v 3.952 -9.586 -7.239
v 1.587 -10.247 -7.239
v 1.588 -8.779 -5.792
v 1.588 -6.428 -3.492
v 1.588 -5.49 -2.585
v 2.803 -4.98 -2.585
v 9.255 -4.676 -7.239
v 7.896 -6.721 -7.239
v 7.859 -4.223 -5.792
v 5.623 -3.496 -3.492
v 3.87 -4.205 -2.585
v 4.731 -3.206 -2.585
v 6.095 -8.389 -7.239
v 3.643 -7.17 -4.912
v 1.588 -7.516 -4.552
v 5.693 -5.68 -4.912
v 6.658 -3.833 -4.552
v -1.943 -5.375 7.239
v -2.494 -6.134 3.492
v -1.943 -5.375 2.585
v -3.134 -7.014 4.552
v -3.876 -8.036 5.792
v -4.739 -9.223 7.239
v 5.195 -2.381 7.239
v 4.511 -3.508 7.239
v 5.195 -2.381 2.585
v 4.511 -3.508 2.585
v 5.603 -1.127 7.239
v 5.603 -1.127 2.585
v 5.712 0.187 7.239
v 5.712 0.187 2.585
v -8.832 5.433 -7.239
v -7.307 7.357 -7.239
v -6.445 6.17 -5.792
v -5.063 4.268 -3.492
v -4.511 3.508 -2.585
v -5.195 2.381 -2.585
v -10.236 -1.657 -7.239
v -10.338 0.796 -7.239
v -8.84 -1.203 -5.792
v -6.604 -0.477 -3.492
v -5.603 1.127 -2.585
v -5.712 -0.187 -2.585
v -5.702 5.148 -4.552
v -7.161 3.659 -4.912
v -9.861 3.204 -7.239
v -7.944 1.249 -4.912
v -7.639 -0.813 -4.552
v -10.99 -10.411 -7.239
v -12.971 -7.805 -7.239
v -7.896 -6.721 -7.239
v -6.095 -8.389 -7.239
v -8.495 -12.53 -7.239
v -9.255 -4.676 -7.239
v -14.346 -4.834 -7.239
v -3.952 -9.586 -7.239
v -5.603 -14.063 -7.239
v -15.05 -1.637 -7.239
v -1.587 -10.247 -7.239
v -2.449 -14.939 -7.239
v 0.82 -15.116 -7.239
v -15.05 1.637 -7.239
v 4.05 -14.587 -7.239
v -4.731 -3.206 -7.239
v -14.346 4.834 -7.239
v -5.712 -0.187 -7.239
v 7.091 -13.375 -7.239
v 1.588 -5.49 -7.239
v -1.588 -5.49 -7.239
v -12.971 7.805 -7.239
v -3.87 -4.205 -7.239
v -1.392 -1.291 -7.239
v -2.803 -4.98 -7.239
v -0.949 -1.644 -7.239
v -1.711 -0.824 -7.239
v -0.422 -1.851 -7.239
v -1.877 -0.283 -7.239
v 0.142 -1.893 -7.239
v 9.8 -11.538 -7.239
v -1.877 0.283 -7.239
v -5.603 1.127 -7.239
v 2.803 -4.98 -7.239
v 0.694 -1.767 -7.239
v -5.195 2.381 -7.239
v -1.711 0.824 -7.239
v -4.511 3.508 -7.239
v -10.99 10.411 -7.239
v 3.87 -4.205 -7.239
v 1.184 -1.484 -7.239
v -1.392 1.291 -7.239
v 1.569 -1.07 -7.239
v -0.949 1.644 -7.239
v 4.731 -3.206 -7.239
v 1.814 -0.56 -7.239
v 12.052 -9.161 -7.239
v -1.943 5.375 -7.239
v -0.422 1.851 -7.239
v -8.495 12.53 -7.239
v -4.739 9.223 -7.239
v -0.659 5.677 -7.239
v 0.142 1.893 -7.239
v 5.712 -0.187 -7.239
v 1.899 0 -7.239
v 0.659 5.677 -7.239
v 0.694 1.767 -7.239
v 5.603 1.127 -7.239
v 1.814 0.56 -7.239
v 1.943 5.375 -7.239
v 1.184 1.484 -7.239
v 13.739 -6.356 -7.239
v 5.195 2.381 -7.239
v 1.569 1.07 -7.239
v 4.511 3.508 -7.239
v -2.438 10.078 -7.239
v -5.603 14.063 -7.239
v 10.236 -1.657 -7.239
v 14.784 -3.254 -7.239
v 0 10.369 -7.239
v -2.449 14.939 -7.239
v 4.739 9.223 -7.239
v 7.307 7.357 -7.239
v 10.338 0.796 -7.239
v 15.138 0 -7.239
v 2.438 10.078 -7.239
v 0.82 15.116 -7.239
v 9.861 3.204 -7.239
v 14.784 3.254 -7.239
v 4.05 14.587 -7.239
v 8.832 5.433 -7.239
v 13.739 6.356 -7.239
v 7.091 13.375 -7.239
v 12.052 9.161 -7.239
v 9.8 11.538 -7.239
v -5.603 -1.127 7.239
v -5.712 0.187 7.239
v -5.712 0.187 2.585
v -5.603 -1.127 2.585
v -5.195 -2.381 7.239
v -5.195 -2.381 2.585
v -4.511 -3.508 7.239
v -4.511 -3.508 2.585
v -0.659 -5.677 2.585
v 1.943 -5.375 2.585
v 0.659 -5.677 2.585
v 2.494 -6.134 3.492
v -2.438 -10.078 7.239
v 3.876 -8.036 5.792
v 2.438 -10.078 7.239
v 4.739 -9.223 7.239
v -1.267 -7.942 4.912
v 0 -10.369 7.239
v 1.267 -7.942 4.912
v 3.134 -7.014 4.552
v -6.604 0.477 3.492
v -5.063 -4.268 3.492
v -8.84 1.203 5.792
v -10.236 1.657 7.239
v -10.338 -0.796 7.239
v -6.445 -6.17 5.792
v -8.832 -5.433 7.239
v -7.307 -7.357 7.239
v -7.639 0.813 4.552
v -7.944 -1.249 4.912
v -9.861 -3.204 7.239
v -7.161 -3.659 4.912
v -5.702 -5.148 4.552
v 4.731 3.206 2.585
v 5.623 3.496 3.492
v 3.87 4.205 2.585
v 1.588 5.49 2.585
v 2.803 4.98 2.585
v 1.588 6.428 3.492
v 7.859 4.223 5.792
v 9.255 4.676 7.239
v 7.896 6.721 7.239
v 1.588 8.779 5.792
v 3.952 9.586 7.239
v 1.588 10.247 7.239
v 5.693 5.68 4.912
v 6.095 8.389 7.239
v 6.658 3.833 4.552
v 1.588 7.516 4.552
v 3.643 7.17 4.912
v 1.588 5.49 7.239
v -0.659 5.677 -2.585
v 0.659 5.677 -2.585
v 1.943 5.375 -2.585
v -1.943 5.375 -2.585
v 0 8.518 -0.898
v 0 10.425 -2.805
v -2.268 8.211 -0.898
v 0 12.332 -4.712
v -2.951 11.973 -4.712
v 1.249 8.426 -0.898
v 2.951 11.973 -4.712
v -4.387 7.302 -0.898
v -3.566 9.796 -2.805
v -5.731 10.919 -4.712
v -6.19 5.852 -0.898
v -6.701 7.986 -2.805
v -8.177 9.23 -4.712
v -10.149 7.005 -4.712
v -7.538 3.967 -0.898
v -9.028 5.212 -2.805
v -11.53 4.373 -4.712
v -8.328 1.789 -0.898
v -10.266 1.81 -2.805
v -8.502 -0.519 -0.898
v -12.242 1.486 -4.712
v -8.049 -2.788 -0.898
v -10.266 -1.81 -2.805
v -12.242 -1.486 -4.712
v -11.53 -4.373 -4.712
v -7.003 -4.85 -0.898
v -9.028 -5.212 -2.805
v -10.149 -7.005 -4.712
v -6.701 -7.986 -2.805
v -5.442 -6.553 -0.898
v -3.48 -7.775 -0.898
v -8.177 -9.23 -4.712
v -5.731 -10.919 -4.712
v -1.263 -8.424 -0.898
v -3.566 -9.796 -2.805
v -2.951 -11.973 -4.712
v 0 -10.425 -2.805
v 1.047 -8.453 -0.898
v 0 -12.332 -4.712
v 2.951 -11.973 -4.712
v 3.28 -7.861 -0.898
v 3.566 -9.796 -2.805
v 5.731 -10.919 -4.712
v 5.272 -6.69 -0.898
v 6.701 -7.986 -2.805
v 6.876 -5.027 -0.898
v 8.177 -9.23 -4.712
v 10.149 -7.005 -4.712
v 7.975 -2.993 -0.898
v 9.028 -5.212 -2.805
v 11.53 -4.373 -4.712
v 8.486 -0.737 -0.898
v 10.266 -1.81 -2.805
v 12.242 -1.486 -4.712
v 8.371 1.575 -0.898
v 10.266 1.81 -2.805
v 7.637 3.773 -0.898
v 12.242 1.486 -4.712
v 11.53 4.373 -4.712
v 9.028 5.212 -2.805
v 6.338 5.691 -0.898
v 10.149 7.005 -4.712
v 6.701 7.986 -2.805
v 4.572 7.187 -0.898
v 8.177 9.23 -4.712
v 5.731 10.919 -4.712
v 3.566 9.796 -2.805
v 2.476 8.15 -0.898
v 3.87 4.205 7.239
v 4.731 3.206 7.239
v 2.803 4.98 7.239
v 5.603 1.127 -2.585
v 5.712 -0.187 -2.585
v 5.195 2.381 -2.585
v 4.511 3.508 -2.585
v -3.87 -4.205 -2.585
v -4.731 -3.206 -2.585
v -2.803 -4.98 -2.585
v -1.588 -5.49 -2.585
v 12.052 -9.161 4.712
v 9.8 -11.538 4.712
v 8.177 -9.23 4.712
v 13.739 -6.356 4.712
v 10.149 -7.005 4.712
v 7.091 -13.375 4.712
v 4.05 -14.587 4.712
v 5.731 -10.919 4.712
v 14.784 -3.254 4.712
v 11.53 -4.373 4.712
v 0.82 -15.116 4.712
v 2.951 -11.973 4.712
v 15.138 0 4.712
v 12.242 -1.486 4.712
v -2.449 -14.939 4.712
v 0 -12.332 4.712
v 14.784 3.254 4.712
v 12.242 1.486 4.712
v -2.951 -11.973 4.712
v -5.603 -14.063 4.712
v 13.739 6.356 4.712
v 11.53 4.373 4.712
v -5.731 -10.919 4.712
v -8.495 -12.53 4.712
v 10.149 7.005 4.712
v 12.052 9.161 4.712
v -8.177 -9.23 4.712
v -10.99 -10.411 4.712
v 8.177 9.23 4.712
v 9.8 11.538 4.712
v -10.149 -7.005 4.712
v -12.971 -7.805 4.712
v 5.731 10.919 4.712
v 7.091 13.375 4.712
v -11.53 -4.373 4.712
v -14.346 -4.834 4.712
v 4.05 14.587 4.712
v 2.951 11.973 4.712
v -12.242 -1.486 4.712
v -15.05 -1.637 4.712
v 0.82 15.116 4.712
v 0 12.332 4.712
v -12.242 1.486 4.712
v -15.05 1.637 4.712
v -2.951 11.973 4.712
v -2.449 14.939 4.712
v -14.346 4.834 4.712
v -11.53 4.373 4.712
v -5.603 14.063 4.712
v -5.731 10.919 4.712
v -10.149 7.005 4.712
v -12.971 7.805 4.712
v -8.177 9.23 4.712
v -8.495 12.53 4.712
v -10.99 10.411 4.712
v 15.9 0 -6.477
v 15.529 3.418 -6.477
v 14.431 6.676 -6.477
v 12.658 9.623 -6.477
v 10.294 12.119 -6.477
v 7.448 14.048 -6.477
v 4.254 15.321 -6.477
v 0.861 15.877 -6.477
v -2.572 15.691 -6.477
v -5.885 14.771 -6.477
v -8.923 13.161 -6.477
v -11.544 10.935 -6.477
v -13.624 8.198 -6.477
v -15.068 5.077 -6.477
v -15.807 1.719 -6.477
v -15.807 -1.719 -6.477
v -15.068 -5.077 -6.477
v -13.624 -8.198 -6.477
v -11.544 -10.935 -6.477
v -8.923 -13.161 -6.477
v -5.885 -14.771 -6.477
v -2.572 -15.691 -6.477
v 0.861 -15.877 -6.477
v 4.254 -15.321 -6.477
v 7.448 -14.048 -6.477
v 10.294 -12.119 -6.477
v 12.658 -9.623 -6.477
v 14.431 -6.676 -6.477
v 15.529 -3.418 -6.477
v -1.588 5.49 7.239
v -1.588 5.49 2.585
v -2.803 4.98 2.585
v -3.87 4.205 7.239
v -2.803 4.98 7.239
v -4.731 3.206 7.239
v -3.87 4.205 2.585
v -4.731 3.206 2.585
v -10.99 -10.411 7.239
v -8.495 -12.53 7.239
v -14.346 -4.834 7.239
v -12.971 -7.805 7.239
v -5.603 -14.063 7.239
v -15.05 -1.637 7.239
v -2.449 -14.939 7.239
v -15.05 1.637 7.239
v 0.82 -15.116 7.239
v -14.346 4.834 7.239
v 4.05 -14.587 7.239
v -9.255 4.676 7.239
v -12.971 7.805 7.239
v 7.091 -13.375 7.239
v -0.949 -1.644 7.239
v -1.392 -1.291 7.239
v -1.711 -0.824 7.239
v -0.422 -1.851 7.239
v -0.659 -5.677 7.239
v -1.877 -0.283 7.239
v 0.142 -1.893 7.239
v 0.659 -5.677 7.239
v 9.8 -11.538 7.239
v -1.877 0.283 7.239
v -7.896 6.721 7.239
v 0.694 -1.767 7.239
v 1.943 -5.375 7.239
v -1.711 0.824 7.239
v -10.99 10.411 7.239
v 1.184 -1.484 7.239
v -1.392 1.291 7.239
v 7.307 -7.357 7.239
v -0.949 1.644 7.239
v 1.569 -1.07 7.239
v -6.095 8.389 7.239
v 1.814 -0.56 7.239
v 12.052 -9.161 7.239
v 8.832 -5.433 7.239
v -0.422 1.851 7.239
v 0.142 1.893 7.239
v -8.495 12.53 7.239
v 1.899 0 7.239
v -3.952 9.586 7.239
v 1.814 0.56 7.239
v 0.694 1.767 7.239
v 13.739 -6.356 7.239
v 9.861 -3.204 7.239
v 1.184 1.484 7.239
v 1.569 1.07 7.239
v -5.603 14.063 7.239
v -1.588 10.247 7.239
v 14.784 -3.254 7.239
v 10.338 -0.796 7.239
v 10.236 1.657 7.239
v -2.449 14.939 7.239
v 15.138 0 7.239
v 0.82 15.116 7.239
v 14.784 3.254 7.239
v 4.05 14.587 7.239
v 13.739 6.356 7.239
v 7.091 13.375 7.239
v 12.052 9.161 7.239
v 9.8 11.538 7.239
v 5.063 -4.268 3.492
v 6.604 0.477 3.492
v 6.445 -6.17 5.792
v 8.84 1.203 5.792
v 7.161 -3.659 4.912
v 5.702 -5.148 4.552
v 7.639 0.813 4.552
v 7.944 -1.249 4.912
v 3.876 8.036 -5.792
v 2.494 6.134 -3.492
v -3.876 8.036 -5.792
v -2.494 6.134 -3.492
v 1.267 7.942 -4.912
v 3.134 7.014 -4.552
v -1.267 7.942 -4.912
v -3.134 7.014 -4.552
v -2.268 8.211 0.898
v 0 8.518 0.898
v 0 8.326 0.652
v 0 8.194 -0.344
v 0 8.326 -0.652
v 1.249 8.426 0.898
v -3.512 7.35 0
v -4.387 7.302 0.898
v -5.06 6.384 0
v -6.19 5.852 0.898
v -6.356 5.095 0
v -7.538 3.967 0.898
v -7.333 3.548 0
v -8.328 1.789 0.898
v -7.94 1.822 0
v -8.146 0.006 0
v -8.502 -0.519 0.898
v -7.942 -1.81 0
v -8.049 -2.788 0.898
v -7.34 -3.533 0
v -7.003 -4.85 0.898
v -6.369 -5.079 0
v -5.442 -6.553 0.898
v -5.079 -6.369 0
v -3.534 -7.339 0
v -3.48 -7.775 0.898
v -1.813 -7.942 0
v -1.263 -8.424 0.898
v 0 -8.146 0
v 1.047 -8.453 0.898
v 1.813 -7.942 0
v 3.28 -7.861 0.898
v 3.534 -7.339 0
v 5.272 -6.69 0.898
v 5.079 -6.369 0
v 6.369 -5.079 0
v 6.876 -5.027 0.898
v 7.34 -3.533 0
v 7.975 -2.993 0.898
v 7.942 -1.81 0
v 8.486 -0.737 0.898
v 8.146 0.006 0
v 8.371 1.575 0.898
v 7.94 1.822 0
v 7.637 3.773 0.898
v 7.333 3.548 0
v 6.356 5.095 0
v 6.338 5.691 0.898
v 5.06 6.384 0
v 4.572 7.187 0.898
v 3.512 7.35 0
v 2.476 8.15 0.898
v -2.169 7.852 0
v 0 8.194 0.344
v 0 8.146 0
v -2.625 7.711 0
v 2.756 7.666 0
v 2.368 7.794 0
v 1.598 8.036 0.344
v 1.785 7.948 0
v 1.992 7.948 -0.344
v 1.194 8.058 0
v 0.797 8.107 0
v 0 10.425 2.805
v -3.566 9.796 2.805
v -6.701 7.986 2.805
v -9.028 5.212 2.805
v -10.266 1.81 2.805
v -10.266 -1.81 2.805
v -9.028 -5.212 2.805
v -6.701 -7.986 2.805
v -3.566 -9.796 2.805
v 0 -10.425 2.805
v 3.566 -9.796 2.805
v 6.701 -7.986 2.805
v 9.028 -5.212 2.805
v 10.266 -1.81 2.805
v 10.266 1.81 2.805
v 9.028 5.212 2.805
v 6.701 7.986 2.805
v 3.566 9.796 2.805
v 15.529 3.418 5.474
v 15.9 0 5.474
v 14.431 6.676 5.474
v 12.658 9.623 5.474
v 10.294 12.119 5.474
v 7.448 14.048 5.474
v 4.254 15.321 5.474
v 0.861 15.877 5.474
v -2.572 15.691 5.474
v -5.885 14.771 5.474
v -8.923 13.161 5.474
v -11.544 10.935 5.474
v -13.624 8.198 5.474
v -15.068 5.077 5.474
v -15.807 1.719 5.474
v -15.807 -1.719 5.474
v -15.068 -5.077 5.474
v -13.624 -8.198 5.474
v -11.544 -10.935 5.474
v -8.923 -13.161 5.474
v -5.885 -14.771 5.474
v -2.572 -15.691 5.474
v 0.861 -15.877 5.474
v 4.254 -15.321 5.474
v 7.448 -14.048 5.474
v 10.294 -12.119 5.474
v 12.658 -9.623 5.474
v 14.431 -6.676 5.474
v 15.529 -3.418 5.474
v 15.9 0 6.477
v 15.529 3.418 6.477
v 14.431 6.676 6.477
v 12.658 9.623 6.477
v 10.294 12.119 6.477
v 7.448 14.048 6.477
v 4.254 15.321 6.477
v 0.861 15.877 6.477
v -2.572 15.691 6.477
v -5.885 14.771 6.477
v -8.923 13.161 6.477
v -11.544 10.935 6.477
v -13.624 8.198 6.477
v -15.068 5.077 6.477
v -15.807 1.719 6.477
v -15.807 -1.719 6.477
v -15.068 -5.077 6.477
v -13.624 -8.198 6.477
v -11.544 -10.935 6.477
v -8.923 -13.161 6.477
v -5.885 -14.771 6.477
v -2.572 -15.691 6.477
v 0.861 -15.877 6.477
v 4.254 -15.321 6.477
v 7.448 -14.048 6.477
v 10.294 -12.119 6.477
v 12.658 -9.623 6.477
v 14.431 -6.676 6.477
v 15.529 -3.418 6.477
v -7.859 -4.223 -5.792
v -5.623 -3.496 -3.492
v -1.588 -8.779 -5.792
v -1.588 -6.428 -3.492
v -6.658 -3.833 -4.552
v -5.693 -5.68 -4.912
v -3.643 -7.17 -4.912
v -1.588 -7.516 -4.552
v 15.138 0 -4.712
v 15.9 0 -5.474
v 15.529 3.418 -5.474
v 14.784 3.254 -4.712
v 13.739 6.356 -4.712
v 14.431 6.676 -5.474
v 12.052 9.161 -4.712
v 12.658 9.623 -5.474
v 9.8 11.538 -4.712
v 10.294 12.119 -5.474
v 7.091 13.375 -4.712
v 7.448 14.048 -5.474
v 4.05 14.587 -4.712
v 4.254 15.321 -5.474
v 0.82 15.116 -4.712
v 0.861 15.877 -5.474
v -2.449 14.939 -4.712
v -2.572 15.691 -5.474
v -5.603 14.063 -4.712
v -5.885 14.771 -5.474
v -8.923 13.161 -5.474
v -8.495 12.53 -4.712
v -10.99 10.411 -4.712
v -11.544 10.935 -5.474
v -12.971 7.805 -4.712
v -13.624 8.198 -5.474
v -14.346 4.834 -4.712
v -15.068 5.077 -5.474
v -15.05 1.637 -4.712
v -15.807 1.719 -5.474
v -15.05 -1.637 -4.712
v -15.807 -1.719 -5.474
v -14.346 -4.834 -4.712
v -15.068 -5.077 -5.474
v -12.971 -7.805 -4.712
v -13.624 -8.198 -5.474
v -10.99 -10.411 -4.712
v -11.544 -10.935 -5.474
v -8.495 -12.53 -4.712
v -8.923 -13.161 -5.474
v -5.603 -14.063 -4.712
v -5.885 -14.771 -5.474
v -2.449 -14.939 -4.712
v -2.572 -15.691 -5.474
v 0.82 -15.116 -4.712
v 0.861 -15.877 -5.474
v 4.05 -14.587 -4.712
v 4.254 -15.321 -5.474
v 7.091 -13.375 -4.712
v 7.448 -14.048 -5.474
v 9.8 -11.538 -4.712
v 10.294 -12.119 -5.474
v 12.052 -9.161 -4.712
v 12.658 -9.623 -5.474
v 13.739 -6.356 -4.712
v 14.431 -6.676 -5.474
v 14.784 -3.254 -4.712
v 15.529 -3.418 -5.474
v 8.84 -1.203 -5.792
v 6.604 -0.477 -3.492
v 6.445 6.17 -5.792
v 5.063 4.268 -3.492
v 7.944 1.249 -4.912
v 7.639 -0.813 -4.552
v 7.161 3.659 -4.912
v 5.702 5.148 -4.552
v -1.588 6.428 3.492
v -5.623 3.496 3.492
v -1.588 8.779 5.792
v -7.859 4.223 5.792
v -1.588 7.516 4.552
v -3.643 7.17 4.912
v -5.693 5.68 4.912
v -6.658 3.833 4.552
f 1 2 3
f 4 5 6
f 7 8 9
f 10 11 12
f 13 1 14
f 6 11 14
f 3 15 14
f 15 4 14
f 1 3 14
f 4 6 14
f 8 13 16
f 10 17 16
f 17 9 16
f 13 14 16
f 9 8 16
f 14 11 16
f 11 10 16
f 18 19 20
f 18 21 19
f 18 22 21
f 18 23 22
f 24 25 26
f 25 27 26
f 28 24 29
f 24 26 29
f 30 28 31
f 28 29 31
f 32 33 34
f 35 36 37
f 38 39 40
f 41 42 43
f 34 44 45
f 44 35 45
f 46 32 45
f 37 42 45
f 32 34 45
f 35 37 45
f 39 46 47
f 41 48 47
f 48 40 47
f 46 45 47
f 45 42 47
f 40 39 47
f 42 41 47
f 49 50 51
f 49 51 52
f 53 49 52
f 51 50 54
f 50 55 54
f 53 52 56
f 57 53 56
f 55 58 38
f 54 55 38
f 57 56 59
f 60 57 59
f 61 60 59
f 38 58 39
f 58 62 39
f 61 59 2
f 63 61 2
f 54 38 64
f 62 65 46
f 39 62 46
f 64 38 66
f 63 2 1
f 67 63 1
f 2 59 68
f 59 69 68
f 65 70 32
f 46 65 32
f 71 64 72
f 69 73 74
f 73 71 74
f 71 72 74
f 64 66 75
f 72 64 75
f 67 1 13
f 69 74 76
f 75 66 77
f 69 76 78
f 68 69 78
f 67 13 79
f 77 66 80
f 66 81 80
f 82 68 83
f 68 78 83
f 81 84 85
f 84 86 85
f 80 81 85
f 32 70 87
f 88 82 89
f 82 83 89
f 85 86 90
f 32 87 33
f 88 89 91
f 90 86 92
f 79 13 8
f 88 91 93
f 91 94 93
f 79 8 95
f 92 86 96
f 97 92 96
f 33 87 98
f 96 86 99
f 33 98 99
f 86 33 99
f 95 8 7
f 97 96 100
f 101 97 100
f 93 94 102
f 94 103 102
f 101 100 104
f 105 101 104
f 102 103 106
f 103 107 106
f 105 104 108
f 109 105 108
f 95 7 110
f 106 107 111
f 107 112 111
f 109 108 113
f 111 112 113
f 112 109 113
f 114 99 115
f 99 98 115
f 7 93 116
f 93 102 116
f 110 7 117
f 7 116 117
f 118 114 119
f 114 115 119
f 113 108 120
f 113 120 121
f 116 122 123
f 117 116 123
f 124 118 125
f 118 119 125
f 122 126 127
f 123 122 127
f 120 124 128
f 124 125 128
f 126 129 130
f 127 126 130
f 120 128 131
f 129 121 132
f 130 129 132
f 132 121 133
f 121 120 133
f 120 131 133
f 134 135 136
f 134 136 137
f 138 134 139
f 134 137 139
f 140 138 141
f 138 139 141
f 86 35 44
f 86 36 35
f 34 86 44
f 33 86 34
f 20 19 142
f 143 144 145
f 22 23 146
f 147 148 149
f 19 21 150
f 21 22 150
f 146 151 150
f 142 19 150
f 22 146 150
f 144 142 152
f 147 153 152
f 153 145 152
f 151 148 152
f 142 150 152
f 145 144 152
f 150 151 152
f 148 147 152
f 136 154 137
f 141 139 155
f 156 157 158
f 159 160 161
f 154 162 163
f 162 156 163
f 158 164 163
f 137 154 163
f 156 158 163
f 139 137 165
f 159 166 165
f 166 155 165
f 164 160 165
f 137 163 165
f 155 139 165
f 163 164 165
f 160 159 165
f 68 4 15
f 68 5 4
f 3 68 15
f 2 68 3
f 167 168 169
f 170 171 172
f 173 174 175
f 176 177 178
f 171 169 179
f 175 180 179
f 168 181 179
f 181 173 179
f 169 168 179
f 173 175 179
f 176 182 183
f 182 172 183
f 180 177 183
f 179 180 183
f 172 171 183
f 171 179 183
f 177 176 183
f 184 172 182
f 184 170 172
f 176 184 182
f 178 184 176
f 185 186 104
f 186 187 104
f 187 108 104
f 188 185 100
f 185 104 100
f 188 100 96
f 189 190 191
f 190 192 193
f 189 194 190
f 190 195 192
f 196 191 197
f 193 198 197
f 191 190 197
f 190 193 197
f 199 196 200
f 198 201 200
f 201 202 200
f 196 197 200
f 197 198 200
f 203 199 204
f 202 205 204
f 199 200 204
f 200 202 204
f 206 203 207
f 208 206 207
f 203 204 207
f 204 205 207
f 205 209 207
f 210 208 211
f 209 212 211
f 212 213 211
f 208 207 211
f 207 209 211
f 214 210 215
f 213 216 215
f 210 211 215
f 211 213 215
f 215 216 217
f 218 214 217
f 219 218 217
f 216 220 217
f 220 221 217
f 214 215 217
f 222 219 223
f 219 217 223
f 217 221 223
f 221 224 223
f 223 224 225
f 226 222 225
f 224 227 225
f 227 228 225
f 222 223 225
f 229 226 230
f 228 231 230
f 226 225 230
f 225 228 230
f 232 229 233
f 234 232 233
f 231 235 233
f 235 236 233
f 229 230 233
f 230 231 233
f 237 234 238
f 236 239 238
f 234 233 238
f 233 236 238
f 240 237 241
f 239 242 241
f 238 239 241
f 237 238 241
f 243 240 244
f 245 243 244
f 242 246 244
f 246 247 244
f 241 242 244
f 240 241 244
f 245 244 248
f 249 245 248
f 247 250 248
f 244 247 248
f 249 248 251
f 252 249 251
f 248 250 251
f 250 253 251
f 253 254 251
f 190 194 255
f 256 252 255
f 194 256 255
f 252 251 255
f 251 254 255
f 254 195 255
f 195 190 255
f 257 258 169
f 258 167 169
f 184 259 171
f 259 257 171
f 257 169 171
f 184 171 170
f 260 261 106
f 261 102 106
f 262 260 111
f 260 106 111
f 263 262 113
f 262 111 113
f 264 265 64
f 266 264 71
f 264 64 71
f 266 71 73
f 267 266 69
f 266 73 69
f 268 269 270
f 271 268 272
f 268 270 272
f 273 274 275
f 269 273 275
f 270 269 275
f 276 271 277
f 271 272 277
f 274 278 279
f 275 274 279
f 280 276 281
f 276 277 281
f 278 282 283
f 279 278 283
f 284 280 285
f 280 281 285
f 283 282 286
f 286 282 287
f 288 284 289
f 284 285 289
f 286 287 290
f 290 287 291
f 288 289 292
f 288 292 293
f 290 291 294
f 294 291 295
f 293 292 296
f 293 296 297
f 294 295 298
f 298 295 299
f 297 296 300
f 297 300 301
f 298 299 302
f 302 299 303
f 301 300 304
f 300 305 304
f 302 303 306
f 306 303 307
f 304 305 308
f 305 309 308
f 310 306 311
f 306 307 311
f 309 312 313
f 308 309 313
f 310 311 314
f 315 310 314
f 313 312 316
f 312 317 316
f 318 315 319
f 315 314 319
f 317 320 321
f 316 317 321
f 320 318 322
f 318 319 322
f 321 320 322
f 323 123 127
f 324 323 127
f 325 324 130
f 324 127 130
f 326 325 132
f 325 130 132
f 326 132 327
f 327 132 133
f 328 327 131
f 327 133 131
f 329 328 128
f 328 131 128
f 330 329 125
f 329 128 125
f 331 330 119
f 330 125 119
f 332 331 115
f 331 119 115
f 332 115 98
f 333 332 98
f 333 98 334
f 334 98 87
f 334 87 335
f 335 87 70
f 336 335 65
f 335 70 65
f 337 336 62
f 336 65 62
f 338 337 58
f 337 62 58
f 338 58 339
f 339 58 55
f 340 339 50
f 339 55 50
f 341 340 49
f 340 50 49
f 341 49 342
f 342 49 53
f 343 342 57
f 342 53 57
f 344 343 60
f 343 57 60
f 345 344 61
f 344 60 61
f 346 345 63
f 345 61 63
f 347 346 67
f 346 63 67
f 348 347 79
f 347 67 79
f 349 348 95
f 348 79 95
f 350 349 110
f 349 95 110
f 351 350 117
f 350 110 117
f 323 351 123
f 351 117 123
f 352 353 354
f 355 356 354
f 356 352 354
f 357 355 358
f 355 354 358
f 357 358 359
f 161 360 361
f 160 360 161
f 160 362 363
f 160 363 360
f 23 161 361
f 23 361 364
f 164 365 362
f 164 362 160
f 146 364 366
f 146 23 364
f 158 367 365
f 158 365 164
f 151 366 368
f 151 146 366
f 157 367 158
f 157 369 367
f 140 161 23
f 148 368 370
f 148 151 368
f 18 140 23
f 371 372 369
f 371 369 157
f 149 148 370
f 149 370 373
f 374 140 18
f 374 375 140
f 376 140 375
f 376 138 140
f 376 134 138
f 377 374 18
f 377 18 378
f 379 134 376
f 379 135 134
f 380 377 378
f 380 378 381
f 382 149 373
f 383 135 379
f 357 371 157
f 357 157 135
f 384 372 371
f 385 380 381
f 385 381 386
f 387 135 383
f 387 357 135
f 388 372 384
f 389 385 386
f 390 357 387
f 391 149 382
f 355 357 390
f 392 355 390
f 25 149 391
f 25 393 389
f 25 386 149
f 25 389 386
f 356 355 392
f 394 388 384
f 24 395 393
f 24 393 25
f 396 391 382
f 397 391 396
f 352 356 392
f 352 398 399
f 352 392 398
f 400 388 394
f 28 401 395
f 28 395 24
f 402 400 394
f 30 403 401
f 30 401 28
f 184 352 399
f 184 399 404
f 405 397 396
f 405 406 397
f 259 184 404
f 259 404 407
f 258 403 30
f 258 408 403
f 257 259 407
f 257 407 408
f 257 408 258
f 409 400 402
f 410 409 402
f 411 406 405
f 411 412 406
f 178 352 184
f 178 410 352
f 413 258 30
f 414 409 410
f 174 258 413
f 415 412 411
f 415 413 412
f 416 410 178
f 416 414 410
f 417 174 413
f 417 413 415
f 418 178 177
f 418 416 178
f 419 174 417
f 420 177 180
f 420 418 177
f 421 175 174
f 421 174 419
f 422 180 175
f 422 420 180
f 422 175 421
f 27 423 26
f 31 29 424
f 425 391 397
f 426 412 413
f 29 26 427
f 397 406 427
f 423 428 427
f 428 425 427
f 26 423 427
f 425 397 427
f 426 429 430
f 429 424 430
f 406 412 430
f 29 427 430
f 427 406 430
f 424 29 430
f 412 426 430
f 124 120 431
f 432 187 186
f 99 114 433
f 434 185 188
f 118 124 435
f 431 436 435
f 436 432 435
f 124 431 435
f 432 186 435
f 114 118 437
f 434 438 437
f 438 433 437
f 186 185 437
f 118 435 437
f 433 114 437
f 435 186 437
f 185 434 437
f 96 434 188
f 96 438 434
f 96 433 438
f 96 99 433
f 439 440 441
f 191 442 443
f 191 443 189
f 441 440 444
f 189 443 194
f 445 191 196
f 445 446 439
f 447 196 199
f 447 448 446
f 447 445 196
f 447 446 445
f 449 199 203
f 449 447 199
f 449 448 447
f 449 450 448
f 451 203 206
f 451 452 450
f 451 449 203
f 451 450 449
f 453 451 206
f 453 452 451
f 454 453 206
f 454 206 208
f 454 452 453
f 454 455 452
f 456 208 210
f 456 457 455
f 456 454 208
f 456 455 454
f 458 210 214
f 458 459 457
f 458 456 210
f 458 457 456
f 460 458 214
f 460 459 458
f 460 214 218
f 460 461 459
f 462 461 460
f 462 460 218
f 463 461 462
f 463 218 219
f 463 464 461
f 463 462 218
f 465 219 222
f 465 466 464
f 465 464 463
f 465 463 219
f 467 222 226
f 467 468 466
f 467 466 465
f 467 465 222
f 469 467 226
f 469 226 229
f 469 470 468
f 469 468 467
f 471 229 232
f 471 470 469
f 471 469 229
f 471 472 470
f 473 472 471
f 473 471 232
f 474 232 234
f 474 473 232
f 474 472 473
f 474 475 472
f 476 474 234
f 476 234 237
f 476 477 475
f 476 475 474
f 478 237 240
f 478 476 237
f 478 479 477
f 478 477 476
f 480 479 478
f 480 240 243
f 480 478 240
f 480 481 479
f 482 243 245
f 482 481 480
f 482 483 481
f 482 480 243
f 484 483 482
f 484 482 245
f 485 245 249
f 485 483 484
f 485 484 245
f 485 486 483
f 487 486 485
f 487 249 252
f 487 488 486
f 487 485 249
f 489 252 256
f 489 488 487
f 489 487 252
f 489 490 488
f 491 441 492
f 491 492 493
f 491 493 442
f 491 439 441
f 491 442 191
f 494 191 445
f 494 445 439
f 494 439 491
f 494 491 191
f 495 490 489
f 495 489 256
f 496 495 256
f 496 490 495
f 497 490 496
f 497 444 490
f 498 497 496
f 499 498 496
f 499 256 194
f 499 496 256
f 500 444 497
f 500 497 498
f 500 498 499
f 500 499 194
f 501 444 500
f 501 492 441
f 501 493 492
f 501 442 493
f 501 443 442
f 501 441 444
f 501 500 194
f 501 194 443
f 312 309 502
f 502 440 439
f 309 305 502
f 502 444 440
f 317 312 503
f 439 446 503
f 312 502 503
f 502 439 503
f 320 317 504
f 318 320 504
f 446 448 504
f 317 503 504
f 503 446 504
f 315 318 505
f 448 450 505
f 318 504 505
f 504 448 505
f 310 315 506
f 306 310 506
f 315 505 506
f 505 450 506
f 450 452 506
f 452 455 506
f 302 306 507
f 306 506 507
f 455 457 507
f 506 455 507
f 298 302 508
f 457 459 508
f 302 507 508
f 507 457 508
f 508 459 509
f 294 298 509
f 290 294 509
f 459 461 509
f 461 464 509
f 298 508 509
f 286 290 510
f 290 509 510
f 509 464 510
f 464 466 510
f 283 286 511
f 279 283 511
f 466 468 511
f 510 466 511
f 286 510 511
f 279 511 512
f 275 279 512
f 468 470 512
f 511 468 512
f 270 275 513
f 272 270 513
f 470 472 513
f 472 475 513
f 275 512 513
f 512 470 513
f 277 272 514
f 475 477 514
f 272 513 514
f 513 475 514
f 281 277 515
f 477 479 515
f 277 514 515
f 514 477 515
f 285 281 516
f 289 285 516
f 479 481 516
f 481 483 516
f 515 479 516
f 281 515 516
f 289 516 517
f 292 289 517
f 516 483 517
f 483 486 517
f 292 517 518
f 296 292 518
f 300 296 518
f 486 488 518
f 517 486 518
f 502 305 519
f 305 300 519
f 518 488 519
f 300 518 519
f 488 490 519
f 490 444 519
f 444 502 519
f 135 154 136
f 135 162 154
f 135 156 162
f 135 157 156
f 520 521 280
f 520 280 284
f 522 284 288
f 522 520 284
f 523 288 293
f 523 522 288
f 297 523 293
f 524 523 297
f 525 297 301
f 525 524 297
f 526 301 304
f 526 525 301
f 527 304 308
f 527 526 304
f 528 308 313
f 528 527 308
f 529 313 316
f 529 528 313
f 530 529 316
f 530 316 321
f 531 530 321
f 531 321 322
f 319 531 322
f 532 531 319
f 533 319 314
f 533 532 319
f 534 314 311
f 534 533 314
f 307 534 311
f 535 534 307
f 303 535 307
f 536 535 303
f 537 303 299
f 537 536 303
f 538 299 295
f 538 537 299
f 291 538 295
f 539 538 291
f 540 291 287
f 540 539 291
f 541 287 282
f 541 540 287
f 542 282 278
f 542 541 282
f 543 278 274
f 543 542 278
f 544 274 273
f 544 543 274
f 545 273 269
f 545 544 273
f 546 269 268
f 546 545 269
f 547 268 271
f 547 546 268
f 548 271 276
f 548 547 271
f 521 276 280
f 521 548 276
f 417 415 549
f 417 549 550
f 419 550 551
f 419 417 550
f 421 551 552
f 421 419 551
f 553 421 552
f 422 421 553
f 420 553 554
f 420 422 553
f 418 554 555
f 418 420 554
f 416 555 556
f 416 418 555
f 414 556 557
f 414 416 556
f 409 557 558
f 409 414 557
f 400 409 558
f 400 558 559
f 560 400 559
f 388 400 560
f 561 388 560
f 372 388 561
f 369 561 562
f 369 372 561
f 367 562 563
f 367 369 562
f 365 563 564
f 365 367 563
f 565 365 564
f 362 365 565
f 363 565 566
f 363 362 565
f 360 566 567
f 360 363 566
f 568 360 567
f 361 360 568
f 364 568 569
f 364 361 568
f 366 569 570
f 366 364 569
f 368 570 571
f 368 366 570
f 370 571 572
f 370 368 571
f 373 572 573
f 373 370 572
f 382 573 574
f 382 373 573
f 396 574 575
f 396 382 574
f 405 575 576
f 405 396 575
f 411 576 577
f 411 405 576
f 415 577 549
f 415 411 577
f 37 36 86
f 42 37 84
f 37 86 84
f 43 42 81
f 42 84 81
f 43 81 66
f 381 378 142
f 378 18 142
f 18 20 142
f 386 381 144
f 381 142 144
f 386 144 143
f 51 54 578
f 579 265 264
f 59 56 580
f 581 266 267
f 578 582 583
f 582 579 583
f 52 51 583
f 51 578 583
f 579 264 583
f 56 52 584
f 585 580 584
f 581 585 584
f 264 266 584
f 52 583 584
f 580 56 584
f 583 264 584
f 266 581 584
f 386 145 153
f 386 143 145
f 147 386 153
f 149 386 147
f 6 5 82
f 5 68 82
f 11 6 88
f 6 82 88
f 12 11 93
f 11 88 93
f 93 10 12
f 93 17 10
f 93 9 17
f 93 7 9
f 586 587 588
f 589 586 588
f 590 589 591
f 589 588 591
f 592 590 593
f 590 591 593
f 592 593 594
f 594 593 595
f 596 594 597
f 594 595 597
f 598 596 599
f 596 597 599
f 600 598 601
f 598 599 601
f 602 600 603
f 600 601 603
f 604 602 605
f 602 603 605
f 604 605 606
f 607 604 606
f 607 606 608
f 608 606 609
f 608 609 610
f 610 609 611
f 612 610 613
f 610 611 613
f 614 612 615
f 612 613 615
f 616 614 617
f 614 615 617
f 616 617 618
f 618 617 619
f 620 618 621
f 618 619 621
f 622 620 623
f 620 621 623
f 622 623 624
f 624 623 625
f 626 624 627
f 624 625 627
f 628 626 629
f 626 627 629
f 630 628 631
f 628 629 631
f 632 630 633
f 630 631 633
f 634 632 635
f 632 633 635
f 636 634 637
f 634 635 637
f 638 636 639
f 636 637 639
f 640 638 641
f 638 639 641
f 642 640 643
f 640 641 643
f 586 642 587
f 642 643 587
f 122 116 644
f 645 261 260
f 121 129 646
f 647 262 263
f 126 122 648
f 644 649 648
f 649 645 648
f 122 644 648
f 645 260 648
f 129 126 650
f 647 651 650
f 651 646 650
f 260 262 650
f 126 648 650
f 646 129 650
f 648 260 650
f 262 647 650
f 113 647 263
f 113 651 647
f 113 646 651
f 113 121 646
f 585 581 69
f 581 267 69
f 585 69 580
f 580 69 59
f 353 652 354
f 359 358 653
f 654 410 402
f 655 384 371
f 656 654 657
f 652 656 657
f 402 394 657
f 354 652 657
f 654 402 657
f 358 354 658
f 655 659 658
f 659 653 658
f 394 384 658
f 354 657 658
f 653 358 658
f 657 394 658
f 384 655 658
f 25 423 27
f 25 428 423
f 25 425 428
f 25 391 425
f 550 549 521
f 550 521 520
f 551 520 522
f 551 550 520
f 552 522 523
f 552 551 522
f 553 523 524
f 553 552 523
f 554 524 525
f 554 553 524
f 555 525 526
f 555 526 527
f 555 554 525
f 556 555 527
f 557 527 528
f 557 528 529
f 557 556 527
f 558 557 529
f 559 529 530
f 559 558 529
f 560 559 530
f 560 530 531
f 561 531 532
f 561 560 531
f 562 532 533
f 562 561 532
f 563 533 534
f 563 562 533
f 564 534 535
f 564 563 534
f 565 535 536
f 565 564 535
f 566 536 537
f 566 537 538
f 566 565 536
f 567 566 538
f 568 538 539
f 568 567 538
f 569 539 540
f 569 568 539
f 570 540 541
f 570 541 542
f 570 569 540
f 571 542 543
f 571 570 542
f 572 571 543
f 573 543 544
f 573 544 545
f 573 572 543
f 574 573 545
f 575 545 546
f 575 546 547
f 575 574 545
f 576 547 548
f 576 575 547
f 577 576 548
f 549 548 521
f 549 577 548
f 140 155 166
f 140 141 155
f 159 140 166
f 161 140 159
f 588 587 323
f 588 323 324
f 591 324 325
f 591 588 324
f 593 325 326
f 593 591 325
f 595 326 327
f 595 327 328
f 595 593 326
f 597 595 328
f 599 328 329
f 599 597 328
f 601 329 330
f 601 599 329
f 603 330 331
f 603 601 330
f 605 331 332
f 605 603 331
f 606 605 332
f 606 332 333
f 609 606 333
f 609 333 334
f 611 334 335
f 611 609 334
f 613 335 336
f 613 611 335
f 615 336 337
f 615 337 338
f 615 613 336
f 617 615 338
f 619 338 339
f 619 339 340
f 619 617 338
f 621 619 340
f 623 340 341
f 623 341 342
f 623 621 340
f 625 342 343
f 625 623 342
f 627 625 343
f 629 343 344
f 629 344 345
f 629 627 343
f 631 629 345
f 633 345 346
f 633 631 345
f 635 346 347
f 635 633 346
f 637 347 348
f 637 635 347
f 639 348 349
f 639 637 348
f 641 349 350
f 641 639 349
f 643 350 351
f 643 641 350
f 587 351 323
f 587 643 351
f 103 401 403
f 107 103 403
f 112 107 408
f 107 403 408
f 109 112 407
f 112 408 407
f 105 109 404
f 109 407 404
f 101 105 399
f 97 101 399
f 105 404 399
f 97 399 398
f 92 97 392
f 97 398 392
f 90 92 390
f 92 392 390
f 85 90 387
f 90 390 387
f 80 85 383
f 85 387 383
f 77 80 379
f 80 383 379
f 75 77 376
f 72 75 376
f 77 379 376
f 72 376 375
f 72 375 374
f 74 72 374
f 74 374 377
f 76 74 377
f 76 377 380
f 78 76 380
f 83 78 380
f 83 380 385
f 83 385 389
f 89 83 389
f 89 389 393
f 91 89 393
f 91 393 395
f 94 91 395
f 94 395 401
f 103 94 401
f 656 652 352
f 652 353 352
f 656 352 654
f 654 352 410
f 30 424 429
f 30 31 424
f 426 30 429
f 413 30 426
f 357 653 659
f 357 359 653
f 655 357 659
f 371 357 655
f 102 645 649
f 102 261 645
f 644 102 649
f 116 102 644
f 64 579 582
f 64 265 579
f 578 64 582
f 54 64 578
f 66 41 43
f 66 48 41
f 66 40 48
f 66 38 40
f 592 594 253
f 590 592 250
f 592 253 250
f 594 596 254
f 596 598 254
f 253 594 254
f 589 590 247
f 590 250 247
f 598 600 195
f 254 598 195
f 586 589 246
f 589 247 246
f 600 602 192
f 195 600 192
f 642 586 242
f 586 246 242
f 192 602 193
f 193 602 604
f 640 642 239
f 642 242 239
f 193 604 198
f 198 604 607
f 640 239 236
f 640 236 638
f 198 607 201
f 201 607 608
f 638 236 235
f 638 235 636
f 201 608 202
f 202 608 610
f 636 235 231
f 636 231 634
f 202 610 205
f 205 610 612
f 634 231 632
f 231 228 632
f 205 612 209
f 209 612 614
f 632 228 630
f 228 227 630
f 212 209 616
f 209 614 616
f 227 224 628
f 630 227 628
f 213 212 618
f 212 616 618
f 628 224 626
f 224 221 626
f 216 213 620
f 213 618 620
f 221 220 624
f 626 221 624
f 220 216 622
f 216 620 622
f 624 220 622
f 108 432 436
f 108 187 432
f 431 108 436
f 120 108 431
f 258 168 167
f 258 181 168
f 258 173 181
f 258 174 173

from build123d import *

# Parameters (mm, degrees)
F0_R     = 15.9004
F1_DEPTH = 7.239
F2_R     = 1.89865
F3_DEPTH = 14.479
F6_W     = 3.175
F6_H     = 7.62
F8_R     = 1.27
F9_SIZE  = 0.762
F10_W    = 3.175
F10_H    = 7.0210194136


with BuildPart() as f1:
    # F0 (on Top) → F1 (new body, symmetric)
    with BuildSketch(Plane.XY):
        Circle(F0_R)
    extrude(amount=F1_DEPTH, both=True)

    # F2 (on face) → F3 (cut, through all)
    with BuildSketch(Plane.XY.offset(7.239)):
        Circle(F2_R)
    extrude(amount=-F3_DEPTH, mode=Mode.SUBTRACT)

    # F4 (on Right) → F5 (revolve, cut)
    with BuildSketch(Plane.YZ):
        Polygon((17.7447939179, -4.7117), (17.7447939179, 4.7117), (12.3317, 4.7117), (7.62, 0), (12.3317, -4.7117), align=None)
        Polygon((11.9630908832, 8.8332189437), (5.715, 8.8332189437), (5.715, 2.5851280605), align=None)
        Polygon((5.715, -2.5851280605), (5.715, -8.8332189437), (11.9630908832, -8.8332189437), align=None)
    revolve(axis=Axis((0, 0, 6.9109424949), (0, 0, 1)), mode=Mode.SUBTRACT)

    # F6 (on face) → F7 (join, up to the next surface of F1)
    with BuildSketch(Plane.XY.offset(7.239)):
        with Locations((0, 8.6958226153)):
            Rectangle(F6_W, F6_H)
        Polygon((-11.4031796113, 5.3743139364), (-12.3843085684, 2.3547094971), (-5.1372579143, 0), (-4.1561289571, 3.0196044392), align=None)
        Polygon((-8.6350525796, -9.1843139364), (-6.0664236225, -11.0505321124), (-1.5875, -4.8858226153), (-4.1561289571, -3.0196044392), align=None)
        Polygon((6.0664236225, -11.0505321124), (8.6350525796, -9.1843139364), (4.1561289571, -3.0196044392), (1.5875, -4.8858226153), align=None)
        Polygon((12.3843085684, 2.3547094971), (11.4031796113, 5.3743139364), (4.1561289571, 3.0196044392), (5.1372579143, 0), align=None)
    extrude(until=Until.NEXT, dir=(0, 0, -1))

    # F8
    f8_edges = [f1.edges().sort_by_distance(p)[0] for p in [
        (0, -7.62, 0),
    ]]
    fillet(f8_edges, radius=F8_R)

    # F9
    f9_edges = [f1.edges().sort_by_distance(p)[0] for p in [
        (-15.9004, 0, 7.239),
        (-15.9004, 0, 4.7117),
        (-15.9004, 0, -4.7117),
        (-15.9004, 0, -7.239),
    ]]
    chamfer(f9_edges, length=F9_SIZE)

    # F10 (on face) → F11 (join, up to the next surface of F1)
    with BuildSketch(Plane(origin=(0, 0, -7.239), x_dir=(1, 0, 0), z_dir=(0, 0, -1))):
        with Locations((0, 8.1105777954)):
            Rectangle(F10_W, F10_H)
        Polygon((-3.8843602525, 2.9313014343), (-10.5617465169, 5.1009157509), (-11.542875474, 2.0813113117), (-4.8654892097, -0.088303005), align=None)
        Polygon((-3.9881666606, -2.788424171), (-8.115018328, -8.4685481944), (-5.5463893709, -10.3347663705), (-1.4195377035, -4.654642347), align=None)
        Polygon((1.4195377035, -4.654642347), (5.5463893709, -10.3347663705), (8.115018328, -8.4685481944), (3.9881666606, -2.788424171), align=None)
        Polygon((4.8654892097, -0.088303005), (11.542875474, 2.0813113117), (10.5617465169, 5.1009157509), (3.8843602525, 2.9313014343), align=None)
    extrude(until=Until.NEXT, dir=(0, 0, 1))


solid = f1.part
